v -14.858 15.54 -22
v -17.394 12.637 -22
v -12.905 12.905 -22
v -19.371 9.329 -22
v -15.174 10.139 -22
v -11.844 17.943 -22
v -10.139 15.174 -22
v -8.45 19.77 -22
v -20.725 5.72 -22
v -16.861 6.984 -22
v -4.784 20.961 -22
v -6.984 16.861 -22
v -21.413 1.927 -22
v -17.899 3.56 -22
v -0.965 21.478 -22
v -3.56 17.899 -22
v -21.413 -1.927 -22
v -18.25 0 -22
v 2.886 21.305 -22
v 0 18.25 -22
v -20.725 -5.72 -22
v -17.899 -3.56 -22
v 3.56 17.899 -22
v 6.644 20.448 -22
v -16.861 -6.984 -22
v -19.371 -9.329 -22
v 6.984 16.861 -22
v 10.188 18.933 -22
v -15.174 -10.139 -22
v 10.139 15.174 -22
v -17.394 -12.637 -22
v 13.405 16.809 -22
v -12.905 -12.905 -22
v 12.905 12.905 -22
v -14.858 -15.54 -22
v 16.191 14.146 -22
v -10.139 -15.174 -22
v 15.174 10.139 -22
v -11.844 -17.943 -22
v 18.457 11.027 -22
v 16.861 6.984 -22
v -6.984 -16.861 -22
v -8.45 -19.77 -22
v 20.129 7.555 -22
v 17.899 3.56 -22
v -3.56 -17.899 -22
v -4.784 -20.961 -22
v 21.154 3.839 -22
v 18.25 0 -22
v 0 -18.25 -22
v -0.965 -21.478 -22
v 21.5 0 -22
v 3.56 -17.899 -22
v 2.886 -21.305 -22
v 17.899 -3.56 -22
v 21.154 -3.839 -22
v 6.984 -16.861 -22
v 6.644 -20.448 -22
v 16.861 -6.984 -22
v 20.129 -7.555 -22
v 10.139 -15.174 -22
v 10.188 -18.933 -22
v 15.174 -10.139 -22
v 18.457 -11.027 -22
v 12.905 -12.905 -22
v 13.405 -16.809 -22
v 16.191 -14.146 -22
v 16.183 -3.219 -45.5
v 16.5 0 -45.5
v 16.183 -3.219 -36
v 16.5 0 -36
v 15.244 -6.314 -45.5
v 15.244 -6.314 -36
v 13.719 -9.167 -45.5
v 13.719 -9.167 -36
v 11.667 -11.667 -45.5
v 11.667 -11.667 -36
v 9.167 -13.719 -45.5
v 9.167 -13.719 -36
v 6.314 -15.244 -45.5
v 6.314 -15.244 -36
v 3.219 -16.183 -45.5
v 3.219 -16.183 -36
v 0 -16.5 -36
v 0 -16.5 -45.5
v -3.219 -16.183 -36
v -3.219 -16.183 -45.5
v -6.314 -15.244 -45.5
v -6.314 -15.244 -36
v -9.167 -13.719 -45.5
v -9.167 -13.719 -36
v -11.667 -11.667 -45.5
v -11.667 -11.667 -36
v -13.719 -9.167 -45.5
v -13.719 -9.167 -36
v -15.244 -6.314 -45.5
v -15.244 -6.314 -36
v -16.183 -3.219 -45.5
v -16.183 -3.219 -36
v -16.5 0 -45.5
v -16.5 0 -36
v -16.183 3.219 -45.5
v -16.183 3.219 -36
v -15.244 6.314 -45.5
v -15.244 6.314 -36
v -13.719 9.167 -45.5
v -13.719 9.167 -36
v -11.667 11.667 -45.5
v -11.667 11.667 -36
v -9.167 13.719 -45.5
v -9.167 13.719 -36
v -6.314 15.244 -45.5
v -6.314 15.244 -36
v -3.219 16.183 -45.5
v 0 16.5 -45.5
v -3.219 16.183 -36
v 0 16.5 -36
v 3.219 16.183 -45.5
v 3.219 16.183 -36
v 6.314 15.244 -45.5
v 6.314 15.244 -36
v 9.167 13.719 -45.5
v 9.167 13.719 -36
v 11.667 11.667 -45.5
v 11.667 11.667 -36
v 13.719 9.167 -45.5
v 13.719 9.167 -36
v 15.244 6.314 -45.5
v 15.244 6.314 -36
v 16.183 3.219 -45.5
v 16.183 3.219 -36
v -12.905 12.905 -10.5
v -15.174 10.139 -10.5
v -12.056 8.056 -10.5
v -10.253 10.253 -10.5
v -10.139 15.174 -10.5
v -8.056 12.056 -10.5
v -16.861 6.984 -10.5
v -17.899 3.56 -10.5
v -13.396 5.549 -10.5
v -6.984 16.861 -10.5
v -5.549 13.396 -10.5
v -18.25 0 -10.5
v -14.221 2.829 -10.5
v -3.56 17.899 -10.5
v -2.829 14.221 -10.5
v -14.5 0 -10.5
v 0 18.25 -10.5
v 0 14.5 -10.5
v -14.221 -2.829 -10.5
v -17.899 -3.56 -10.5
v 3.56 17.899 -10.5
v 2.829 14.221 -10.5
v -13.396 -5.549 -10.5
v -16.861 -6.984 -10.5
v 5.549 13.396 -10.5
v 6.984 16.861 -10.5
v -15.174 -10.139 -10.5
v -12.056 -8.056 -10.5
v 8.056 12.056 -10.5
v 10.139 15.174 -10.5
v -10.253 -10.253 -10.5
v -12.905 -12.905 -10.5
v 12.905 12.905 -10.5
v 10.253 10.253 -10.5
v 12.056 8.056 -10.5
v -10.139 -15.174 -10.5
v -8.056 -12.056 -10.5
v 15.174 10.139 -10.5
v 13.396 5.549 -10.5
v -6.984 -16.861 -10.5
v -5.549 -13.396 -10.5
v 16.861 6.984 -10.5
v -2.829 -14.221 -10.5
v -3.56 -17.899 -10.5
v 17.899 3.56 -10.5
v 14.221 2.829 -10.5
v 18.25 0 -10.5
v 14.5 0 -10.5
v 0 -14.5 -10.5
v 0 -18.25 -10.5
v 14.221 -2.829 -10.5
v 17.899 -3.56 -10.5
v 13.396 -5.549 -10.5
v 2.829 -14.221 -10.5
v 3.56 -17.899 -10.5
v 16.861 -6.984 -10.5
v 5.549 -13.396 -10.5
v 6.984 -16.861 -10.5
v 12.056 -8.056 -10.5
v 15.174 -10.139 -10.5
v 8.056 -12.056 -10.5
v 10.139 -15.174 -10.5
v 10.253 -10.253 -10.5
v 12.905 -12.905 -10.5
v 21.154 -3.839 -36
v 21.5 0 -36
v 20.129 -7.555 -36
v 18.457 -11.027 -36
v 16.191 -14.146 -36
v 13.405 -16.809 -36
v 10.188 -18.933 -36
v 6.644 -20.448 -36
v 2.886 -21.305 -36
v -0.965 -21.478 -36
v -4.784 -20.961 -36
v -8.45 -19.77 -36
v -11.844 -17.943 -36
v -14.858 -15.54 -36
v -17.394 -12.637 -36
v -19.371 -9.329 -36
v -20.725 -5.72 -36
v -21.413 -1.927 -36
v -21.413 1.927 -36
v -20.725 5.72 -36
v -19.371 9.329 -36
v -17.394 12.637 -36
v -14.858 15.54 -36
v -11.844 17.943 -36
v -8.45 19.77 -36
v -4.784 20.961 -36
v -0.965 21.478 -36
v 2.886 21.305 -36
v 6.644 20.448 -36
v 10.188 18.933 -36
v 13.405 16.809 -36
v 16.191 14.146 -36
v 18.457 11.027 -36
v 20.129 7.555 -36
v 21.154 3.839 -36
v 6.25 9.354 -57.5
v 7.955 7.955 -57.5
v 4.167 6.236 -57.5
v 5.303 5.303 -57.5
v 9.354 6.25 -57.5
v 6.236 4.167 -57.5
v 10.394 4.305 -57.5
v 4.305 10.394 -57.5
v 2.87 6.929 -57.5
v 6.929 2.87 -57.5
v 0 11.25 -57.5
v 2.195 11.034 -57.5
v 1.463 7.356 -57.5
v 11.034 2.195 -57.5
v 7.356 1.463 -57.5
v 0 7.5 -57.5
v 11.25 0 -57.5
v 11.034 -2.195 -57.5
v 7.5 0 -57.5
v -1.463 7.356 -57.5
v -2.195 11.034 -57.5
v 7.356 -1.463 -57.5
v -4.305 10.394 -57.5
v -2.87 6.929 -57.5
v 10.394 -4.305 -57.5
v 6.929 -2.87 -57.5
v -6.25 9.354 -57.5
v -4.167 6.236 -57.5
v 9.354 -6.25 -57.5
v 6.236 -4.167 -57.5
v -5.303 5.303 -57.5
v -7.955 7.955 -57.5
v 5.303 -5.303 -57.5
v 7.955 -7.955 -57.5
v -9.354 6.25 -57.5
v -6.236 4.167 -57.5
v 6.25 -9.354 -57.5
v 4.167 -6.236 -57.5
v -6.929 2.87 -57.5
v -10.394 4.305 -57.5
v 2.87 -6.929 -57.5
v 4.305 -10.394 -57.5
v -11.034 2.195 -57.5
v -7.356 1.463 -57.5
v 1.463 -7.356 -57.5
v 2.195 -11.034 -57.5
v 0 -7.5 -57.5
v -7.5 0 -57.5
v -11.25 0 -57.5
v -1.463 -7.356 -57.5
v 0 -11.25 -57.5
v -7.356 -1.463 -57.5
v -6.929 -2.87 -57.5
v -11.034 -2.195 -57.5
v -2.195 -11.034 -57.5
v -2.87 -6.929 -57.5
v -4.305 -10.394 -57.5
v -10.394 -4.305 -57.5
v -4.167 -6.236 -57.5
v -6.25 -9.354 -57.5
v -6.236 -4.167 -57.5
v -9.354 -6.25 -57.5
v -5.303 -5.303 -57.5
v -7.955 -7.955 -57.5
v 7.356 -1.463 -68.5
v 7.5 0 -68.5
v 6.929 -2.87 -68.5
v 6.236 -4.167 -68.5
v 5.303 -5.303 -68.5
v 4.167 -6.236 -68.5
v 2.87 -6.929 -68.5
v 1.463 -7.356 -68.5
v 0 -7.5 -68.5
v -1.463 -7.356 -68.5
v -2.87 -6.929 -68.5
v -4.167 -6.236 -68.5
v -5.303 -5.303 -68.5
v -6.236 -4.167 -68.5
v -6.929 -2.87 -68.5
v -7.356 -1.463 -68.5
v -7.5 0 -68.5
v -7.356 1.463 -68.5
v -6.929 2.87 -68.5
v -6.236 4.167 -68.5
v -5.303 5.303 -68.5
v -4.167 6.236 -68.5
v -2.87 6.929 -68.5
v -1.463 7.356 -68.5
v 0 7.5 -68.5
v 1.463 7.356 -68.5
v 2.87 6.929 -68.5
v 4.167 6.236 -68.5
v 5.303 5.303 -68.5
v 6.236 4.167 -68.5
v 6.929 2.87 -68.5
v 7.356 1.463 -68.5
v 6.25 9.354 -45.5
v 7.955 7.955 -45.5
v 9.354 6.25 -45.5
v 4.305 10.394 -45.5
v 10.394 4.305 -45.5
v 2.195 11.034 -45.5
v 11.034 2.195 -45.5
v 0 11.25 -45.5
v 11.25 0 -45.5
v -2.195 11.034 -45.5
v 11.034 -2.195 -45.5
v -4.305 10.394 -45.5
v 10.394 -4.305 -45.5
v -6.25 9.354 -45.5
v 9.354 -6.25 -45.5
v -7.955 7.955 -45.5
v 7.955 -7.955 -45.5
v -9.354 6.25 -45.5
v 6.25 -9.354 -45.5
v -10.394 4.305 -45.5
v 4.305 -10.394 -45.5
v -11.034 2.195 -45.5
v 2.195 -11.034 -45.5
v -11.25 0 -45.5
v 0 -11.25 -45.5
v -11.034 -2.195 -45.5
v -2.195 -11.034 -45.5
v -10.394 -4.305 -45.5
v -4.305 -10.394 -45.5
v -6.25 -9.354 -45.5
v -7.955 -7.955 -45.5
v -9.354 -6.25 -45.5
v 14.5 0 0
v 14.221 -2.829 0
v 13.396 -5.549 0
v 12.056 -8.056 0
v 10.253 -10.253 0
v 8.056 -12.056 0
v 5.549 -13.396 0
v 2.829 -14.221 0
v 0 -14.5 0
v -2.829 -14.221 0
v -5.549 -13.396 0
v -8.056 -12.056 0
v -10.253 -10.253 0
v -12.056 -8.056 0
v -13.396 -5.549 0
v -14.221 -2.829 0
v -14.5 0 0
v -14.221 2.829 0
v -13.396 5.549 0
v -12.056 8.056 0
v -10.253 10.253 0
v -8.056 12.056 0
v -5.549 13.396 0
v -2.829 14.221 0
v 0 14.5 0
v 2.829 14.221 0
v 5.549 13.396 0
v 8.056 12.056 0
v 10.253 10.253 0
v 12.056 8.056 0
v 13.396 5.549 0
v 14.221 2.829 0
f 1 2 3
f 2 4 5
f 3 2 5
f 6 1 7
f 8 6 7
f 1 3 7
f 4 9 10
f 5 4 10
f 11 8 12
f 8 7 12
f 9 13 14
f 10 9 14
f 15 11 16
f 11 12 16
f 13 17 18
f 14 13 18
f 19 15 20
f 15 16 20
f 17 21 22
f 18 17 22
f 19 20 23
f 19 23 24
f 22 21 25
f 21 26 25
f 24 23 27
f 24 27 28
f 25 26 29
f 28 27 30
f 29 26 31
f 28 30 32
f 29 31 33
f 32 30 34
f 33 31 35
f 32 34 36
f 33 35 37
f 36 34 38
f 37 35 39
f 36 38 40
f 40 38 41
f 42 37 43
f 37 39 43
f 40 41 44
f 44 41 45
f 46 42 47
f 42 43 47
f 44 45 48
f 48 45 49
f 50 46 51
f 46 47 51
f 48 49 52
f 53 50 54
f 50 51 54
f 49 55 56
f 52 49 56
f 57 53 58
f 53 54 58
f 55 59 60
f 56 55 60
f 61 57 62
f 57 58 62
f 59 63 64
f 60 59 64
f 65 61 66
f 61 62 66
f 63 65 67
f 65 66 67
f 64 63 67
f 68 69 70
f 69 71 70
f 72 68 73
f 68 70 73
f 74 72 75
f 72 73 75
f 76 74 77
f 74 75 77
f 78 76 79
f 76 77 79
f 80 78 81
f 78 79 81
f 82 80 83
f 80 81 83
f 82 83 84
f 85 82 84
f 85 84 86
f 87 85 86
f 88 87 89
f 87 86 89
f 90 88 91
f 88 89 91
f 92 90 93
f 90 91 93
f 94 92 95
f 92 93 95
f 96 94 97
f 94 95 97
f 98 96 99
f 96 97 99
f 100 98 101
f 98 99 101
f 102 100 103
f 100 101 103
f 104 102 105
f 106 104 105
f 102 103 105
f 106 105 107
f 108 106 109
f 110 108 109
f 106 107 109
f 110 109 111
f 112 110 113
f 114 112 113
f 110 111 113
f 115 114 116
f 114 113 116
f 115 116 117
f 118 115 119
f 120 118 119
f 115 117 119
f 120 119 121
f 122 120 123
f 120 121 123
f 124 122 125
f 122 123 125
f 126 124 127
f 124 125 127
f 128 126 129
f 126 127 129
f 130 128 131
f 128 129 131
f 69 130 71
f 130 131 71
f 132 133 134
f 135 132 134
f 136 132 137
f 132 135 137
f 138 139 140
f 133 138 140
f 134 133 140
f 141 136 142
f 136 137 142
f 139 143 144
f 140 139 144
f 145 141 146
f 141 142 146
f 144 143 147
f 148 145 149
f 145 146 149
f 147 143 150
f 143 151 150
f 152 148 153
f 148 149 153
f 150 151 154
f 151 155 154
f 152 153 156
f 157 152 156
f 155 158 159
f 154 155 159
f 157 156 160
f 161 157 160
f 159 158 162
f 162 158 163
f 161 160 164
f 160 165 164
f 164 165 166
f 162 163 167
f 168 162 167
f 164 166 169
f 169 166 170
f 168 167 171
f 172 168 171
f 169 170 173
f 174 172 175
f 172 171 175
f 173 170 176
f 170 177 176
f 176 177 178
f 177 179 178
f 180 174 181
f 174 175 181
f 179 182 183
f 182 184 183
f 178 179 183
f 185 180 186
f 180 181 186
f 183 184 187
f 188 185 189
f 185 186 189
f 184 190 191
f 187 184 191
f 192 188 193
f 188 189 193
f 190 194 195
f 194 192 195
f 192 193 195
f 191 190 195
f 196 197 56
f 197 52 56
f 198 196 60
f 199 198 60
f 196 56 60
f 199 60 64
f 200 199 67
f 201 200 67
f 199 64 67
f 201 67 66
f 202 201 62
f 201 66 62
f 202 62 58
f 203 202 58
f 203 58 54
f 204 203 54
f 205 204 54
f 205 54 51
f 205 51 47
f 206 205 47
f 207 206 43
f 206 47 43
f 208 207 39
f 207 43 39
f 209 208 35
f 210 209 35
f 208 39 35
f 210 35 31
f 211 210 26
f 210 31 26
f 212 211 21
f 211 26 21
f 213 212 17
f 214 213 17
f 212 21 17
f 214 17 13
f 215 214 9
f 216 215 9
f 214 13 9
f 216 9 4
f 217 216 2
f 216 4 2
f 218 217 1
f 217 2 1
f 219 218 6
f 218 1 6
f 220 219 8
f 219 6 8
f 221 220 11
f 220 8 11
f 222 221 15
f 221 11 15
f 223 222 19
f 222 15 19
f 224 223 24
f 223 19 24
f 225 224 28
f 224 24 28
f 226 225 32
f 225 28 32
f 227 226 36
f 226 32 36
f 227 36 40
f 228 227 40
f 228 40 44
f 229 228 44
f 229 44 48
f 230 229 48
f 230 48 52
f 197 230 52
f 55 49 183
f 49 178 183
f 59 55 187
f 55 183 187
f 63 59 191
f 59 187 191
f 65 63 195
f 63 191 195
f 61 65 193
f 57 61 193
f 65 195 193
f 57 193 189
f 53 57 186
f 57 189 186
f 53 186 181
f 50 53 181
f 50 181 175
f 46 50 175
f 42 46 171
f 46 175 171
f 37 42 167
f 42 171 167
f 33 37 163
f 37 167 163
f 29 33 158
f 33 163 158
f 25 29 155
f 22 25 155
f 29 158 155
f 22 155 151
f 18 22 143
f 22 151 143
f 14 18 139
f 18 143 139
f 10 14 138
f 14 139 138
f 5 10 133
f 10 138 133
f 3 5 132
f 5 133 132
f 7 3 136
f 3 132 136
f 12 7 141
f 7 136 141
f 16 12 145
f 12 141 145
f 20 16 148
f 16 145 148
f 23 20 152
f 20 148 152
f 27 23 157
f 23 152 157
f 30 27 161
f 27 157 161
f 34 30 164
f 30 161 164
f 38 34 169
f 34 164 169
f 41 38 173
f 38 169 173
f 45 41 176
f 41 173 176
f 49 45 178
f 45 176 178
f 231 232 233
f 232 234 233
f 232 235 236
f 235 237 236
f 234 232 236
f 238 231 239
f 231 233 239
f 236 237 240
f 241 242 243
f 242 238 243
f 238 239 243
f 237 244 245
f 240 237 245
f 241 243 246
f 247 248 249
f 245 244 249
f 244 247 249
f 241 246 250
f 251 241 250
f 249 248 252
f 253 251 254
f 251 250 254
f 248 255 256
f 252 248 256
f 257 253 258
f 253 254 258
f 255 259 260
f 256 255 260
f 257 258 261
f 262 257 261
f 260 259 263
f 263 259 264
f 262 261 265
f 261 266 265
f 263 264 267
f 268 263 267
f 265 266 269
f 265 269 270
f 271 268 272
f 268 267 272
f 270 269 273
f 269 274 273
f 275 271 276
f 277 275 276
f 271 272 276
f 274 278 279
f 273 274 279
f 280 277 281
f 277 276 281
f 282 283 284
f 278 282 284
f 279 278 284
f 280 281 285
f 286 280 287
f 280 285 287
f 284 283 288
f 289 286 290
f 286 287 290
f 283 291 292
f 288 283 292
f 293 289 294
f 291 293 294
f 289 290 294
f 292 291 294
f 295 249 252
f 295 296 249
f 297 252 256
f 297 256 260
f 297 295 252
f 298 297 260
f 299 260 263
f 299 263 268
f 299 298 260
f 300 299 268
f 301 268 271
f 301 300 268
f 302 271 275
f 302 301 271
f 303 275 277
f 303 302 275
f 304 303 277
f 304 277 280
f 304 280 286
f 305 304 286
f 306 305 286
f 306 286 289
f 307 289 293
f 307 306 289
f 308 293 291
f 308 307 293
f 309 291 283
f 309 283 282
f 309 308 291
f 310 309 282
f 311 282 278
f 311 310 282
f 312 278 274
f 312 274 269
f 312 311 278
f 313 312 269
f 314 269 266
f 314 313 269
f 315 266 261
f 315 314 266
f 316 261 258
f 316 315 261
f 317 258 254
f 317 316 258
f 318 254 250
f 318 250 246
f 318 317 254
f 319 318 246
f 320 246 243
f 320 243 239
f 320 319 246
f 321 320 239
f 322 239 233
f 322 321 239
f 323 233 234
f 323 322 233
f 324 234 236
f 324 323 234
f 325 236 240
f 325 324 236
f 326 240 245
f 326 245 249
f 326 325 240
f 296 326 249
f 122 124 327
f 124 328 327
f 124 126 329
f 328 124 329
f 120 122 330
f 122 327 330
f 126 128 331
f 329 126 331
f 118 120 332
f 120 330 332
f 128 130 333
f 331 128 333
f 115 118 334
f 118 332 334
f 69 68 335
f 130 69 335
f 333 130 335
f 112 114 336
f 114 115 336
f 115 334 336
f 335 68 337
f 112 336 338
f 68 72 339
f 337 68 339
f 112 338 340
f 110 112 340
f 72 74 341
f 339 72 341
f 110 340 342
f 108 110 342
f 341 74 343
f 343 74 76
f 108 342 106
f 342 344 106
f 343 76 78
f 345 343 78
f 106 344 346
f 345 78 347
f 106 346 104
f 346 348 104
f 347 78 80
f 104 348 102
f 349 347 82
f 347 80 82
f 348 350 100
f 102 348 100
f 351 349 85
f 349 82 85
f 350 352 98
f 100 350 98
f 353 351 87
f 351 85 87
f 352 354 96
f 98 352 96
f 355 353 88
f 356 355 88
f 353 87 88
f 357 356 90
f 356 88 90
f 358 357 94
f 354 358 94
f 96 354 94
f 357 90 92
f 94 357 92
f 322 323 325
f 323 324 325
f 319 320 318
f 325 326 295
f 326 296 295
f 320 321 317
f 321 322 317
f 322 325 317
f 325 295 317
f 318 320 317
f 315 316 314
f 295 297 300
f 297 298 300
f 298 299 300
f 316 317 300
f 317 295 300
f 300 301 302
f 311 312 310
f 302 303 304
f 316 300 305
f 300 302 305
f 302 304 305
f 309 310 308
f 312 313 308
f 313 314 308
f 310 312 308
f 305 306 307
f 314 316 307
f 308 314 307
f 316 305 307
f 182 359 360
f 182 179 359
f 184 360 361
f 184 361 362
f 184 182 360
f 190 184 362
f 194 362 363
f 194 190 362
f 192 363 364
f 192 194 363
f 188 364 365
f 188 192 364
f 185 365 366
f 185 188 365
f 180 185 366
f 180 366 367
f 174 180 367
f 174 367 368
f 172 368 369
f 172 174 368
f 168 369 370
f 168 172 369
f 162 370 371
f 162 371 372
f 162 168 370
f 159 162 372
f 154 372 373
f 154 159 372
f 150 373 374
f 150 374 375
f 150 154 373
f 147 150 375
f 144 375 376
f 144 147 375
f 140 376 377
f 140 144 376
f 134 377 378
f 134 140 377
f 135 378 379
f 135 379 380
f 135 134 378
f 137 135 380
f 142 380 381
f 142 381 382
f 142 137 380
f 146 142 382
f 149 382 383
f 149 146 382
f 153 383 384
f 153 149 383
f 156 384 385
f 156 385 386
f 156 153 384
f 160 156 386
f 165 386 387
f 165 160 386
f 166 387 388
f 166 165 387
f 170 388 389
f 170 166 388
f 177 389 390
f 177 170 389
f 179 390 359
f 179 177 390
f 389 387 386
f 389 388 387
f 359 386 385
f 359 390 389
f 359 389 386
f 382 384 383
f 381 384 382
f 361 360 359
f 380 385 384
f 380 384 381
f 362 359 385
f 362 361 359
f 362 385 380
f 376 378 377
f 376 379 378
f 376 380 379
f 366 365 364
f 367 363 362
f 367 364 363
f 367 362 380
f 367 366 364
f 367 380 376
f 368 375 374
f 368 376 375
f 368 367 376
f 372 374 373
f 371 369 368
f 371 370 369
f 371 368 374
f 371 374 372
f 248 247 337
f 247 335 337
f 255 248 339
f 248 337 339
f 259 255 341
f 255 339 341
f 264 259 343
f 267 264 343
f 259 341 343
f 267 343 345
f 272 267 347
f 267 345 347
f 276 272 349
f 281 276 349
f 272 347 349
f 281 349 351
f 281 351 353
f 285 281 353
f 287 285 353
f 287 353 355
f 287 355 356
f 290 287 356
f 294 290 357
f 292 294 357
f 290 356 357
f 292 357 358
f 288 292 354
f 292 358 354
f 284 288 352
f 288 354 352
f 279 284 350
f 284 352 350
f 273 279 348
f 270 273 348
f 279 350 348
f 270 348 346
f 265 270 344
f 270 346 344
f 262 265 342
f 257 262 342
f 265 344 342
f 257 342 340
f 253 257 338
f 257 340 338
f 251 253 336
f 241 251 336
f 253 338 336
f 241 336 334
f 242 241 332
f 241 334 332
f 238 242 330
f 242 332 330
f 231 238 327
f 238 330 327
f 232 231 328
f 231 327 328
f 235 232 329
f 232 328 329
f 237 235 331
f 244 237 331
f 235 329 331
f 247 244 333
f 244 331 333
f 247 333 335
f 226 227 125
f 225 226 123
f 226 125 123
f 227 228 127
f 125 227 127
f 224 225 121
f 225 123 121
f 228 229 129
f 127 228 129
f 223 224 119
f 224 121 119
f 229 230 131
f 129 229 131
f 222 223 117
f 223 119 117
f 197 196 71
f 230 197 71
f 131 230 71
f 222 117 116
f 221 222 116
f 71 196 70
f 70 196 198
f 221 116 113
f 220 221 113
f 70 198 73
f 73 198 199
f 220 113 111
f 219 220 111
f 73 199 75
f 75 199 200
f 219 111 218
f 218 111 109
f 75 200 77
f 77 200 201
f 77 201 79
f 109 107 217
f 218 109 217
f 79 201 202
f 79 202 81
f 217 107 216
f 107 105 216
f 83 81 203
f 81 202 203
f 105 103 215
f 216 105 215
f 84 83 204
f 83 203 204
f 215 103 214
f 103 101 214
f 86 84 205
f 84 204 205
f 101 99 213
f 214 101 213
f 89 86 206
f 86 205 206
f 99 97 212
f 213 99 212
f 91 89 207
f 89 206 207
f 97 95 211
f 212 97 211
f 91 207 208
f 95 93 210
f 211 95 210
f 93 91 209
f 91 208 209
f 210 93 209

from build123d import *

# Parameters (mm, degrees)
SKETCH1_W   = 10.5
SKETCH1_H   = 14.5
SKETCH1_W_2 = 11
SKETCH1_H_2 = 7.5


with BuildPart() as part:
    # Sketch1 → Revolve1 (revolve)
    with BuildSketch(Plane(origin=(0, 0, 0), x_dir=(0, 0, -1), z_dir=(1, 0, 0)), mode=Mode.PRIVATE) as revolve1_sk:
        with Locations((5.25, 7.25)):
            Rectangle(SKETCH1_W, SKETCH1_H)
        Polygon((10.5, 14.5), (10.5, 0), (22, 0), (22, 18.25), (10.5, 18.25), align=None)
        Polygon((22, 18.25), (22, 0), (36, 0), (36, 16.5), (36, 21.5), (22, 21.5), align=None)
        Polygon((36, 16.5), (36, 0), (45.5, 0), (45.5, 11.25), (45.5, 16.5), align=None)
        Polygon((45.5, 11.25), (45.5, 0), (57.5, 0), (57.5, 7.5), (57.5, 11.25), align=None)
        with Locations((63, 3.75)):
            Rectangle(SKETCH1_W_2, SKETCH1_H_2)
    revolve(revolve1_sk.sketch.rotate(Axis((0, 0, -22), (0, 0, -1)), 90), axis=Axis((0, 0, -22), (0, 0, -1)))


solid = part.part
